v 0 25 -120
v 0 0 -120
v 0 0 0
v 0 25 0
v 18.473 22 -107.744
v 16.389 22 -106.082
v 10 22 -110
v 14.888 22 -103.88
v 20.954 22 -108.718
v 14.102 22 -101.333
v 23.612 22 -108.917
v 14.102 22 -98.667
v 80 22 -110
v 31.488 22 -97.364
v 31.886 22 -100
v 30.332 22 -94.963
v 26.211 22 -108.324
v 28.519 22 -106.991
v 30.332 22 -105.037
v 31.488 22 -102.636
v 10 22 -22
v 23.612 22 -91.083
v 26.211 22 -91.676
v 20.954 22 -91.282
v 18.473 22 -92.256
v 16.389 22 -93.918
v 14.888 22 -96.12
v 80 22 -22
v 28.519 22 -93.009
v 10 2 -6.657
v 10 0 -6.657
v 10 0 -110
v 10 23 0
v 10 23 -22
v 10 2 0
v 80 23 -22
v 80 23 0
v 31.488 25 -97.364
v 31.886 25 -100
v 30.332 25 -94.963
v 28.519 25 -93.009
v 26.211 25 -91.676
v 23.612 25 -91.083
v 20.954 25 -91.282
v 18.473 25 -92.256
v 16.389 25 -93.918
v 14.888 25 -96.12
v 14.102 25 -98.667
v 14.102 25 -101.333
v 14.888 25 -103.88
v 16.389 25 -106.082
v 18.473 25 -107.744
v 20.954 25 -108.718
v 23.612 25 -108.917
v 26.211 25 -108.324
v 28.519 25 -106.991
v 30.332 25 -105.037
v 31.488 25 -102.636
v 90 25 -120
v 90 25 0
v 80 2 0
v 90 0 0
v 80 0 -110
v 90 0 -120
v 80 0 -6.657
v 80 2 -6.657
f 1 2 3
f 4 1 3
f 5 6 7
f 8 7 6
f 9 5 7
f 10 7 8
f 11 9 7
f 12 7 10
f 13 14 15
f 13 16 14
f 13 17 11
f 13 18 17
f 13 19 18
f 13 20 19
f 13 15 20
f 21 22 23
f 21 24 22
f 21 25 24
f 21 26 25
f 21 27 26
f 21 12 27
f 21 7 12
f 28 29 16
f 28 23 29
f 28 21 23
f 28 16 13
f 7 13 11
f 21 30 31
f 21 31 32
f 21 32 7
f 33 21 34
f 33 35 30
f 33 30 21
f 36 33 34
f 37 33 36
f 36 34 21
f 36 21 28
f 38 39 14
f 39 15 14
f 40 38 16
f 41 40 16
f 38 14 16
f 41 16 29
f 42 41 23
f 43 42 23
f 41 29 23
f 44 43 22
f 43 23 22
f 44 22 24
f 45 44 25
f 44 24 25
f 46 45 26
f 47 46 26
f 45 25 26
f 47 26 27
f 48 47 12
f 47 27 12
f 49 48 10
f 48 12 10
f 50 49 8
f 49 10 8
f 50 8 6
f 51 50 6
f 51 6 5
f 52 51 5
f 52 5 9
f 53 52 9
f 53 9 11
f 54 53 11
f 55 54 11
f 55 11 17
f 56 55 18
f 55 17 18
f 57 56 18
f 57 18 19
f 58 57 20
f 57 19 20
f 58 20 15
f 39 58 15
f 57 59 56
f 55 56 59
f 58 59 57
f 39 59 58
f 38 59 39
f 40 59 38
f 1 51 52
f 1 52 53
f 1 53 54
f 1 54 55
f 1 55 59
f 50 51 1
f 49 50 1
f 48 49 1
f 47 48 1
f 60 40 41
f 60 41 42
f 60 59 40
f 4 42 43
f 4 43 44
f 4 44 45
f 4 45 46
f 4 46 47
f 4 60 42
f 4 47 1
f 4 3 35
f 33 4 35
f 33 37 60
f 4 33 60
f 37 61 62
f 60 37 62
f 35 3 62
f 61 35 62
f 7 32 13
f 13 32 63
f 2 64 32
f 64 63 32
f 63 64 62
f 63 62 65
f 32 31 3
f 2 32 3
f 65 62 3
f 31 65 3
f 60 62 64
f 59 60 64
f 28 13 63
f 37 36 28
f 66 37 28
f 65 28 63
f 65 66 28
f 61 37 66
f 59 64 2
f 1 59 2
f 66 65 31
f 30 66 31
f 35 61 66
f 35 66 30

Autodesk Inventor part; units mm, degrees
ref_plane "YZ Plane" through (0, 0, 0) normal (1, 0, 0) x (0, 1, 0)
ref_plane "XZ Plane" through (0, 0, 0) normal (0, 1, 0) x (-1, 0, 0)
ref_plane "XY Plane" through (0, 0, 0) normal (0, 0, 1) x (1, 0, 0)
sketch "Sketch1" plane through (0, 0, 0) normal (0, 1, 0) x (-1, 0, 0)
  line L0 (0, 0) -> (-90, 0)
  line L1 (-90, 0) -> (-90, -120)
  line L2 (-90, -120) -> (0, -120)
  line L3 (0, -120) -> (0, 0)
  dimension "d0" = 90
  dimension "d1" = 120
extrude "Extrusion1" add sketch "Sketch1" along normal blind 25
sketch "Sketch2" plane through (0, 0, 0) normal (0, -1, 0) x (1, 0, 0)
  line L0 (80, -6.6572) -> (10, -6.6572)
  line L1 (10, -6.6572) -> (10, -110)
  line L2 (10, -110) -> (80, -110)
  line L3 (80, -110) -> (80, -6.6572)
  line L4 (0, -120) -> (0, 0) projected
  line L5 (0, 0) -> (90, 0) projected
  line L6 (90, -120) -> (0, -120) projected
  line L7 (90, 0) -> (90, -120) projected
  dimension "d4" = 10
  dimension "d5" = 6.6572
  dimension "d6" = 10
  dimension "d7" = 10
extrude "Extrusion2" cut sketch "Sketch2" against normal blind 22 contours L3 L2 L1 L0
sketch "Sketch3" plane through (0, 25, 0) normal (0, 1, 0) x (1, 0, 0)
  point P0 (0, 0)
sketch "Sketch4" plane through (0, 22, 0) normal (0, -1, 0) x (1, 0, 0)
  circle A0 centre (22.9438, -100) radius 8.9417
  line L0 (90, -120) -> (0, -120) projected
  point P0 (0, 0)
  dimension "d10" = 20
  dimension "d19" = 17.8834
extrude "Extrusion3" cut sketch "Sketch4" against normal blind 22
sketch "Sketch5" plane through (0, 0, 0) normal (0, 0, 1) x (1, 0, 0)
  line L0 (10, 23) -> (80, 23)
  line L1 (80, 23) -> (80, 2)
  line L2 (80, 2) -> (10, 2)
  line L3 (10, 2) -> (10, 23)
  line L4 (0, 0) -> (0, 25) projected
  line L5 (90, 0) -> (90, 25) projected
  line L6 (0, 0) -> (90, 0) projected
  line L7 (90, 25) -> (0, 25) projected
  dimension "d13" = 10
  dimension "d14" = 10
  dimension "d15" = 2
  dimension "d16" = 2
extrude "Extrusion4" cut sketch "Sketch5" against normal blind 22 contours L0 L1 L2 L3
properties part number "Case_Top_Part"
